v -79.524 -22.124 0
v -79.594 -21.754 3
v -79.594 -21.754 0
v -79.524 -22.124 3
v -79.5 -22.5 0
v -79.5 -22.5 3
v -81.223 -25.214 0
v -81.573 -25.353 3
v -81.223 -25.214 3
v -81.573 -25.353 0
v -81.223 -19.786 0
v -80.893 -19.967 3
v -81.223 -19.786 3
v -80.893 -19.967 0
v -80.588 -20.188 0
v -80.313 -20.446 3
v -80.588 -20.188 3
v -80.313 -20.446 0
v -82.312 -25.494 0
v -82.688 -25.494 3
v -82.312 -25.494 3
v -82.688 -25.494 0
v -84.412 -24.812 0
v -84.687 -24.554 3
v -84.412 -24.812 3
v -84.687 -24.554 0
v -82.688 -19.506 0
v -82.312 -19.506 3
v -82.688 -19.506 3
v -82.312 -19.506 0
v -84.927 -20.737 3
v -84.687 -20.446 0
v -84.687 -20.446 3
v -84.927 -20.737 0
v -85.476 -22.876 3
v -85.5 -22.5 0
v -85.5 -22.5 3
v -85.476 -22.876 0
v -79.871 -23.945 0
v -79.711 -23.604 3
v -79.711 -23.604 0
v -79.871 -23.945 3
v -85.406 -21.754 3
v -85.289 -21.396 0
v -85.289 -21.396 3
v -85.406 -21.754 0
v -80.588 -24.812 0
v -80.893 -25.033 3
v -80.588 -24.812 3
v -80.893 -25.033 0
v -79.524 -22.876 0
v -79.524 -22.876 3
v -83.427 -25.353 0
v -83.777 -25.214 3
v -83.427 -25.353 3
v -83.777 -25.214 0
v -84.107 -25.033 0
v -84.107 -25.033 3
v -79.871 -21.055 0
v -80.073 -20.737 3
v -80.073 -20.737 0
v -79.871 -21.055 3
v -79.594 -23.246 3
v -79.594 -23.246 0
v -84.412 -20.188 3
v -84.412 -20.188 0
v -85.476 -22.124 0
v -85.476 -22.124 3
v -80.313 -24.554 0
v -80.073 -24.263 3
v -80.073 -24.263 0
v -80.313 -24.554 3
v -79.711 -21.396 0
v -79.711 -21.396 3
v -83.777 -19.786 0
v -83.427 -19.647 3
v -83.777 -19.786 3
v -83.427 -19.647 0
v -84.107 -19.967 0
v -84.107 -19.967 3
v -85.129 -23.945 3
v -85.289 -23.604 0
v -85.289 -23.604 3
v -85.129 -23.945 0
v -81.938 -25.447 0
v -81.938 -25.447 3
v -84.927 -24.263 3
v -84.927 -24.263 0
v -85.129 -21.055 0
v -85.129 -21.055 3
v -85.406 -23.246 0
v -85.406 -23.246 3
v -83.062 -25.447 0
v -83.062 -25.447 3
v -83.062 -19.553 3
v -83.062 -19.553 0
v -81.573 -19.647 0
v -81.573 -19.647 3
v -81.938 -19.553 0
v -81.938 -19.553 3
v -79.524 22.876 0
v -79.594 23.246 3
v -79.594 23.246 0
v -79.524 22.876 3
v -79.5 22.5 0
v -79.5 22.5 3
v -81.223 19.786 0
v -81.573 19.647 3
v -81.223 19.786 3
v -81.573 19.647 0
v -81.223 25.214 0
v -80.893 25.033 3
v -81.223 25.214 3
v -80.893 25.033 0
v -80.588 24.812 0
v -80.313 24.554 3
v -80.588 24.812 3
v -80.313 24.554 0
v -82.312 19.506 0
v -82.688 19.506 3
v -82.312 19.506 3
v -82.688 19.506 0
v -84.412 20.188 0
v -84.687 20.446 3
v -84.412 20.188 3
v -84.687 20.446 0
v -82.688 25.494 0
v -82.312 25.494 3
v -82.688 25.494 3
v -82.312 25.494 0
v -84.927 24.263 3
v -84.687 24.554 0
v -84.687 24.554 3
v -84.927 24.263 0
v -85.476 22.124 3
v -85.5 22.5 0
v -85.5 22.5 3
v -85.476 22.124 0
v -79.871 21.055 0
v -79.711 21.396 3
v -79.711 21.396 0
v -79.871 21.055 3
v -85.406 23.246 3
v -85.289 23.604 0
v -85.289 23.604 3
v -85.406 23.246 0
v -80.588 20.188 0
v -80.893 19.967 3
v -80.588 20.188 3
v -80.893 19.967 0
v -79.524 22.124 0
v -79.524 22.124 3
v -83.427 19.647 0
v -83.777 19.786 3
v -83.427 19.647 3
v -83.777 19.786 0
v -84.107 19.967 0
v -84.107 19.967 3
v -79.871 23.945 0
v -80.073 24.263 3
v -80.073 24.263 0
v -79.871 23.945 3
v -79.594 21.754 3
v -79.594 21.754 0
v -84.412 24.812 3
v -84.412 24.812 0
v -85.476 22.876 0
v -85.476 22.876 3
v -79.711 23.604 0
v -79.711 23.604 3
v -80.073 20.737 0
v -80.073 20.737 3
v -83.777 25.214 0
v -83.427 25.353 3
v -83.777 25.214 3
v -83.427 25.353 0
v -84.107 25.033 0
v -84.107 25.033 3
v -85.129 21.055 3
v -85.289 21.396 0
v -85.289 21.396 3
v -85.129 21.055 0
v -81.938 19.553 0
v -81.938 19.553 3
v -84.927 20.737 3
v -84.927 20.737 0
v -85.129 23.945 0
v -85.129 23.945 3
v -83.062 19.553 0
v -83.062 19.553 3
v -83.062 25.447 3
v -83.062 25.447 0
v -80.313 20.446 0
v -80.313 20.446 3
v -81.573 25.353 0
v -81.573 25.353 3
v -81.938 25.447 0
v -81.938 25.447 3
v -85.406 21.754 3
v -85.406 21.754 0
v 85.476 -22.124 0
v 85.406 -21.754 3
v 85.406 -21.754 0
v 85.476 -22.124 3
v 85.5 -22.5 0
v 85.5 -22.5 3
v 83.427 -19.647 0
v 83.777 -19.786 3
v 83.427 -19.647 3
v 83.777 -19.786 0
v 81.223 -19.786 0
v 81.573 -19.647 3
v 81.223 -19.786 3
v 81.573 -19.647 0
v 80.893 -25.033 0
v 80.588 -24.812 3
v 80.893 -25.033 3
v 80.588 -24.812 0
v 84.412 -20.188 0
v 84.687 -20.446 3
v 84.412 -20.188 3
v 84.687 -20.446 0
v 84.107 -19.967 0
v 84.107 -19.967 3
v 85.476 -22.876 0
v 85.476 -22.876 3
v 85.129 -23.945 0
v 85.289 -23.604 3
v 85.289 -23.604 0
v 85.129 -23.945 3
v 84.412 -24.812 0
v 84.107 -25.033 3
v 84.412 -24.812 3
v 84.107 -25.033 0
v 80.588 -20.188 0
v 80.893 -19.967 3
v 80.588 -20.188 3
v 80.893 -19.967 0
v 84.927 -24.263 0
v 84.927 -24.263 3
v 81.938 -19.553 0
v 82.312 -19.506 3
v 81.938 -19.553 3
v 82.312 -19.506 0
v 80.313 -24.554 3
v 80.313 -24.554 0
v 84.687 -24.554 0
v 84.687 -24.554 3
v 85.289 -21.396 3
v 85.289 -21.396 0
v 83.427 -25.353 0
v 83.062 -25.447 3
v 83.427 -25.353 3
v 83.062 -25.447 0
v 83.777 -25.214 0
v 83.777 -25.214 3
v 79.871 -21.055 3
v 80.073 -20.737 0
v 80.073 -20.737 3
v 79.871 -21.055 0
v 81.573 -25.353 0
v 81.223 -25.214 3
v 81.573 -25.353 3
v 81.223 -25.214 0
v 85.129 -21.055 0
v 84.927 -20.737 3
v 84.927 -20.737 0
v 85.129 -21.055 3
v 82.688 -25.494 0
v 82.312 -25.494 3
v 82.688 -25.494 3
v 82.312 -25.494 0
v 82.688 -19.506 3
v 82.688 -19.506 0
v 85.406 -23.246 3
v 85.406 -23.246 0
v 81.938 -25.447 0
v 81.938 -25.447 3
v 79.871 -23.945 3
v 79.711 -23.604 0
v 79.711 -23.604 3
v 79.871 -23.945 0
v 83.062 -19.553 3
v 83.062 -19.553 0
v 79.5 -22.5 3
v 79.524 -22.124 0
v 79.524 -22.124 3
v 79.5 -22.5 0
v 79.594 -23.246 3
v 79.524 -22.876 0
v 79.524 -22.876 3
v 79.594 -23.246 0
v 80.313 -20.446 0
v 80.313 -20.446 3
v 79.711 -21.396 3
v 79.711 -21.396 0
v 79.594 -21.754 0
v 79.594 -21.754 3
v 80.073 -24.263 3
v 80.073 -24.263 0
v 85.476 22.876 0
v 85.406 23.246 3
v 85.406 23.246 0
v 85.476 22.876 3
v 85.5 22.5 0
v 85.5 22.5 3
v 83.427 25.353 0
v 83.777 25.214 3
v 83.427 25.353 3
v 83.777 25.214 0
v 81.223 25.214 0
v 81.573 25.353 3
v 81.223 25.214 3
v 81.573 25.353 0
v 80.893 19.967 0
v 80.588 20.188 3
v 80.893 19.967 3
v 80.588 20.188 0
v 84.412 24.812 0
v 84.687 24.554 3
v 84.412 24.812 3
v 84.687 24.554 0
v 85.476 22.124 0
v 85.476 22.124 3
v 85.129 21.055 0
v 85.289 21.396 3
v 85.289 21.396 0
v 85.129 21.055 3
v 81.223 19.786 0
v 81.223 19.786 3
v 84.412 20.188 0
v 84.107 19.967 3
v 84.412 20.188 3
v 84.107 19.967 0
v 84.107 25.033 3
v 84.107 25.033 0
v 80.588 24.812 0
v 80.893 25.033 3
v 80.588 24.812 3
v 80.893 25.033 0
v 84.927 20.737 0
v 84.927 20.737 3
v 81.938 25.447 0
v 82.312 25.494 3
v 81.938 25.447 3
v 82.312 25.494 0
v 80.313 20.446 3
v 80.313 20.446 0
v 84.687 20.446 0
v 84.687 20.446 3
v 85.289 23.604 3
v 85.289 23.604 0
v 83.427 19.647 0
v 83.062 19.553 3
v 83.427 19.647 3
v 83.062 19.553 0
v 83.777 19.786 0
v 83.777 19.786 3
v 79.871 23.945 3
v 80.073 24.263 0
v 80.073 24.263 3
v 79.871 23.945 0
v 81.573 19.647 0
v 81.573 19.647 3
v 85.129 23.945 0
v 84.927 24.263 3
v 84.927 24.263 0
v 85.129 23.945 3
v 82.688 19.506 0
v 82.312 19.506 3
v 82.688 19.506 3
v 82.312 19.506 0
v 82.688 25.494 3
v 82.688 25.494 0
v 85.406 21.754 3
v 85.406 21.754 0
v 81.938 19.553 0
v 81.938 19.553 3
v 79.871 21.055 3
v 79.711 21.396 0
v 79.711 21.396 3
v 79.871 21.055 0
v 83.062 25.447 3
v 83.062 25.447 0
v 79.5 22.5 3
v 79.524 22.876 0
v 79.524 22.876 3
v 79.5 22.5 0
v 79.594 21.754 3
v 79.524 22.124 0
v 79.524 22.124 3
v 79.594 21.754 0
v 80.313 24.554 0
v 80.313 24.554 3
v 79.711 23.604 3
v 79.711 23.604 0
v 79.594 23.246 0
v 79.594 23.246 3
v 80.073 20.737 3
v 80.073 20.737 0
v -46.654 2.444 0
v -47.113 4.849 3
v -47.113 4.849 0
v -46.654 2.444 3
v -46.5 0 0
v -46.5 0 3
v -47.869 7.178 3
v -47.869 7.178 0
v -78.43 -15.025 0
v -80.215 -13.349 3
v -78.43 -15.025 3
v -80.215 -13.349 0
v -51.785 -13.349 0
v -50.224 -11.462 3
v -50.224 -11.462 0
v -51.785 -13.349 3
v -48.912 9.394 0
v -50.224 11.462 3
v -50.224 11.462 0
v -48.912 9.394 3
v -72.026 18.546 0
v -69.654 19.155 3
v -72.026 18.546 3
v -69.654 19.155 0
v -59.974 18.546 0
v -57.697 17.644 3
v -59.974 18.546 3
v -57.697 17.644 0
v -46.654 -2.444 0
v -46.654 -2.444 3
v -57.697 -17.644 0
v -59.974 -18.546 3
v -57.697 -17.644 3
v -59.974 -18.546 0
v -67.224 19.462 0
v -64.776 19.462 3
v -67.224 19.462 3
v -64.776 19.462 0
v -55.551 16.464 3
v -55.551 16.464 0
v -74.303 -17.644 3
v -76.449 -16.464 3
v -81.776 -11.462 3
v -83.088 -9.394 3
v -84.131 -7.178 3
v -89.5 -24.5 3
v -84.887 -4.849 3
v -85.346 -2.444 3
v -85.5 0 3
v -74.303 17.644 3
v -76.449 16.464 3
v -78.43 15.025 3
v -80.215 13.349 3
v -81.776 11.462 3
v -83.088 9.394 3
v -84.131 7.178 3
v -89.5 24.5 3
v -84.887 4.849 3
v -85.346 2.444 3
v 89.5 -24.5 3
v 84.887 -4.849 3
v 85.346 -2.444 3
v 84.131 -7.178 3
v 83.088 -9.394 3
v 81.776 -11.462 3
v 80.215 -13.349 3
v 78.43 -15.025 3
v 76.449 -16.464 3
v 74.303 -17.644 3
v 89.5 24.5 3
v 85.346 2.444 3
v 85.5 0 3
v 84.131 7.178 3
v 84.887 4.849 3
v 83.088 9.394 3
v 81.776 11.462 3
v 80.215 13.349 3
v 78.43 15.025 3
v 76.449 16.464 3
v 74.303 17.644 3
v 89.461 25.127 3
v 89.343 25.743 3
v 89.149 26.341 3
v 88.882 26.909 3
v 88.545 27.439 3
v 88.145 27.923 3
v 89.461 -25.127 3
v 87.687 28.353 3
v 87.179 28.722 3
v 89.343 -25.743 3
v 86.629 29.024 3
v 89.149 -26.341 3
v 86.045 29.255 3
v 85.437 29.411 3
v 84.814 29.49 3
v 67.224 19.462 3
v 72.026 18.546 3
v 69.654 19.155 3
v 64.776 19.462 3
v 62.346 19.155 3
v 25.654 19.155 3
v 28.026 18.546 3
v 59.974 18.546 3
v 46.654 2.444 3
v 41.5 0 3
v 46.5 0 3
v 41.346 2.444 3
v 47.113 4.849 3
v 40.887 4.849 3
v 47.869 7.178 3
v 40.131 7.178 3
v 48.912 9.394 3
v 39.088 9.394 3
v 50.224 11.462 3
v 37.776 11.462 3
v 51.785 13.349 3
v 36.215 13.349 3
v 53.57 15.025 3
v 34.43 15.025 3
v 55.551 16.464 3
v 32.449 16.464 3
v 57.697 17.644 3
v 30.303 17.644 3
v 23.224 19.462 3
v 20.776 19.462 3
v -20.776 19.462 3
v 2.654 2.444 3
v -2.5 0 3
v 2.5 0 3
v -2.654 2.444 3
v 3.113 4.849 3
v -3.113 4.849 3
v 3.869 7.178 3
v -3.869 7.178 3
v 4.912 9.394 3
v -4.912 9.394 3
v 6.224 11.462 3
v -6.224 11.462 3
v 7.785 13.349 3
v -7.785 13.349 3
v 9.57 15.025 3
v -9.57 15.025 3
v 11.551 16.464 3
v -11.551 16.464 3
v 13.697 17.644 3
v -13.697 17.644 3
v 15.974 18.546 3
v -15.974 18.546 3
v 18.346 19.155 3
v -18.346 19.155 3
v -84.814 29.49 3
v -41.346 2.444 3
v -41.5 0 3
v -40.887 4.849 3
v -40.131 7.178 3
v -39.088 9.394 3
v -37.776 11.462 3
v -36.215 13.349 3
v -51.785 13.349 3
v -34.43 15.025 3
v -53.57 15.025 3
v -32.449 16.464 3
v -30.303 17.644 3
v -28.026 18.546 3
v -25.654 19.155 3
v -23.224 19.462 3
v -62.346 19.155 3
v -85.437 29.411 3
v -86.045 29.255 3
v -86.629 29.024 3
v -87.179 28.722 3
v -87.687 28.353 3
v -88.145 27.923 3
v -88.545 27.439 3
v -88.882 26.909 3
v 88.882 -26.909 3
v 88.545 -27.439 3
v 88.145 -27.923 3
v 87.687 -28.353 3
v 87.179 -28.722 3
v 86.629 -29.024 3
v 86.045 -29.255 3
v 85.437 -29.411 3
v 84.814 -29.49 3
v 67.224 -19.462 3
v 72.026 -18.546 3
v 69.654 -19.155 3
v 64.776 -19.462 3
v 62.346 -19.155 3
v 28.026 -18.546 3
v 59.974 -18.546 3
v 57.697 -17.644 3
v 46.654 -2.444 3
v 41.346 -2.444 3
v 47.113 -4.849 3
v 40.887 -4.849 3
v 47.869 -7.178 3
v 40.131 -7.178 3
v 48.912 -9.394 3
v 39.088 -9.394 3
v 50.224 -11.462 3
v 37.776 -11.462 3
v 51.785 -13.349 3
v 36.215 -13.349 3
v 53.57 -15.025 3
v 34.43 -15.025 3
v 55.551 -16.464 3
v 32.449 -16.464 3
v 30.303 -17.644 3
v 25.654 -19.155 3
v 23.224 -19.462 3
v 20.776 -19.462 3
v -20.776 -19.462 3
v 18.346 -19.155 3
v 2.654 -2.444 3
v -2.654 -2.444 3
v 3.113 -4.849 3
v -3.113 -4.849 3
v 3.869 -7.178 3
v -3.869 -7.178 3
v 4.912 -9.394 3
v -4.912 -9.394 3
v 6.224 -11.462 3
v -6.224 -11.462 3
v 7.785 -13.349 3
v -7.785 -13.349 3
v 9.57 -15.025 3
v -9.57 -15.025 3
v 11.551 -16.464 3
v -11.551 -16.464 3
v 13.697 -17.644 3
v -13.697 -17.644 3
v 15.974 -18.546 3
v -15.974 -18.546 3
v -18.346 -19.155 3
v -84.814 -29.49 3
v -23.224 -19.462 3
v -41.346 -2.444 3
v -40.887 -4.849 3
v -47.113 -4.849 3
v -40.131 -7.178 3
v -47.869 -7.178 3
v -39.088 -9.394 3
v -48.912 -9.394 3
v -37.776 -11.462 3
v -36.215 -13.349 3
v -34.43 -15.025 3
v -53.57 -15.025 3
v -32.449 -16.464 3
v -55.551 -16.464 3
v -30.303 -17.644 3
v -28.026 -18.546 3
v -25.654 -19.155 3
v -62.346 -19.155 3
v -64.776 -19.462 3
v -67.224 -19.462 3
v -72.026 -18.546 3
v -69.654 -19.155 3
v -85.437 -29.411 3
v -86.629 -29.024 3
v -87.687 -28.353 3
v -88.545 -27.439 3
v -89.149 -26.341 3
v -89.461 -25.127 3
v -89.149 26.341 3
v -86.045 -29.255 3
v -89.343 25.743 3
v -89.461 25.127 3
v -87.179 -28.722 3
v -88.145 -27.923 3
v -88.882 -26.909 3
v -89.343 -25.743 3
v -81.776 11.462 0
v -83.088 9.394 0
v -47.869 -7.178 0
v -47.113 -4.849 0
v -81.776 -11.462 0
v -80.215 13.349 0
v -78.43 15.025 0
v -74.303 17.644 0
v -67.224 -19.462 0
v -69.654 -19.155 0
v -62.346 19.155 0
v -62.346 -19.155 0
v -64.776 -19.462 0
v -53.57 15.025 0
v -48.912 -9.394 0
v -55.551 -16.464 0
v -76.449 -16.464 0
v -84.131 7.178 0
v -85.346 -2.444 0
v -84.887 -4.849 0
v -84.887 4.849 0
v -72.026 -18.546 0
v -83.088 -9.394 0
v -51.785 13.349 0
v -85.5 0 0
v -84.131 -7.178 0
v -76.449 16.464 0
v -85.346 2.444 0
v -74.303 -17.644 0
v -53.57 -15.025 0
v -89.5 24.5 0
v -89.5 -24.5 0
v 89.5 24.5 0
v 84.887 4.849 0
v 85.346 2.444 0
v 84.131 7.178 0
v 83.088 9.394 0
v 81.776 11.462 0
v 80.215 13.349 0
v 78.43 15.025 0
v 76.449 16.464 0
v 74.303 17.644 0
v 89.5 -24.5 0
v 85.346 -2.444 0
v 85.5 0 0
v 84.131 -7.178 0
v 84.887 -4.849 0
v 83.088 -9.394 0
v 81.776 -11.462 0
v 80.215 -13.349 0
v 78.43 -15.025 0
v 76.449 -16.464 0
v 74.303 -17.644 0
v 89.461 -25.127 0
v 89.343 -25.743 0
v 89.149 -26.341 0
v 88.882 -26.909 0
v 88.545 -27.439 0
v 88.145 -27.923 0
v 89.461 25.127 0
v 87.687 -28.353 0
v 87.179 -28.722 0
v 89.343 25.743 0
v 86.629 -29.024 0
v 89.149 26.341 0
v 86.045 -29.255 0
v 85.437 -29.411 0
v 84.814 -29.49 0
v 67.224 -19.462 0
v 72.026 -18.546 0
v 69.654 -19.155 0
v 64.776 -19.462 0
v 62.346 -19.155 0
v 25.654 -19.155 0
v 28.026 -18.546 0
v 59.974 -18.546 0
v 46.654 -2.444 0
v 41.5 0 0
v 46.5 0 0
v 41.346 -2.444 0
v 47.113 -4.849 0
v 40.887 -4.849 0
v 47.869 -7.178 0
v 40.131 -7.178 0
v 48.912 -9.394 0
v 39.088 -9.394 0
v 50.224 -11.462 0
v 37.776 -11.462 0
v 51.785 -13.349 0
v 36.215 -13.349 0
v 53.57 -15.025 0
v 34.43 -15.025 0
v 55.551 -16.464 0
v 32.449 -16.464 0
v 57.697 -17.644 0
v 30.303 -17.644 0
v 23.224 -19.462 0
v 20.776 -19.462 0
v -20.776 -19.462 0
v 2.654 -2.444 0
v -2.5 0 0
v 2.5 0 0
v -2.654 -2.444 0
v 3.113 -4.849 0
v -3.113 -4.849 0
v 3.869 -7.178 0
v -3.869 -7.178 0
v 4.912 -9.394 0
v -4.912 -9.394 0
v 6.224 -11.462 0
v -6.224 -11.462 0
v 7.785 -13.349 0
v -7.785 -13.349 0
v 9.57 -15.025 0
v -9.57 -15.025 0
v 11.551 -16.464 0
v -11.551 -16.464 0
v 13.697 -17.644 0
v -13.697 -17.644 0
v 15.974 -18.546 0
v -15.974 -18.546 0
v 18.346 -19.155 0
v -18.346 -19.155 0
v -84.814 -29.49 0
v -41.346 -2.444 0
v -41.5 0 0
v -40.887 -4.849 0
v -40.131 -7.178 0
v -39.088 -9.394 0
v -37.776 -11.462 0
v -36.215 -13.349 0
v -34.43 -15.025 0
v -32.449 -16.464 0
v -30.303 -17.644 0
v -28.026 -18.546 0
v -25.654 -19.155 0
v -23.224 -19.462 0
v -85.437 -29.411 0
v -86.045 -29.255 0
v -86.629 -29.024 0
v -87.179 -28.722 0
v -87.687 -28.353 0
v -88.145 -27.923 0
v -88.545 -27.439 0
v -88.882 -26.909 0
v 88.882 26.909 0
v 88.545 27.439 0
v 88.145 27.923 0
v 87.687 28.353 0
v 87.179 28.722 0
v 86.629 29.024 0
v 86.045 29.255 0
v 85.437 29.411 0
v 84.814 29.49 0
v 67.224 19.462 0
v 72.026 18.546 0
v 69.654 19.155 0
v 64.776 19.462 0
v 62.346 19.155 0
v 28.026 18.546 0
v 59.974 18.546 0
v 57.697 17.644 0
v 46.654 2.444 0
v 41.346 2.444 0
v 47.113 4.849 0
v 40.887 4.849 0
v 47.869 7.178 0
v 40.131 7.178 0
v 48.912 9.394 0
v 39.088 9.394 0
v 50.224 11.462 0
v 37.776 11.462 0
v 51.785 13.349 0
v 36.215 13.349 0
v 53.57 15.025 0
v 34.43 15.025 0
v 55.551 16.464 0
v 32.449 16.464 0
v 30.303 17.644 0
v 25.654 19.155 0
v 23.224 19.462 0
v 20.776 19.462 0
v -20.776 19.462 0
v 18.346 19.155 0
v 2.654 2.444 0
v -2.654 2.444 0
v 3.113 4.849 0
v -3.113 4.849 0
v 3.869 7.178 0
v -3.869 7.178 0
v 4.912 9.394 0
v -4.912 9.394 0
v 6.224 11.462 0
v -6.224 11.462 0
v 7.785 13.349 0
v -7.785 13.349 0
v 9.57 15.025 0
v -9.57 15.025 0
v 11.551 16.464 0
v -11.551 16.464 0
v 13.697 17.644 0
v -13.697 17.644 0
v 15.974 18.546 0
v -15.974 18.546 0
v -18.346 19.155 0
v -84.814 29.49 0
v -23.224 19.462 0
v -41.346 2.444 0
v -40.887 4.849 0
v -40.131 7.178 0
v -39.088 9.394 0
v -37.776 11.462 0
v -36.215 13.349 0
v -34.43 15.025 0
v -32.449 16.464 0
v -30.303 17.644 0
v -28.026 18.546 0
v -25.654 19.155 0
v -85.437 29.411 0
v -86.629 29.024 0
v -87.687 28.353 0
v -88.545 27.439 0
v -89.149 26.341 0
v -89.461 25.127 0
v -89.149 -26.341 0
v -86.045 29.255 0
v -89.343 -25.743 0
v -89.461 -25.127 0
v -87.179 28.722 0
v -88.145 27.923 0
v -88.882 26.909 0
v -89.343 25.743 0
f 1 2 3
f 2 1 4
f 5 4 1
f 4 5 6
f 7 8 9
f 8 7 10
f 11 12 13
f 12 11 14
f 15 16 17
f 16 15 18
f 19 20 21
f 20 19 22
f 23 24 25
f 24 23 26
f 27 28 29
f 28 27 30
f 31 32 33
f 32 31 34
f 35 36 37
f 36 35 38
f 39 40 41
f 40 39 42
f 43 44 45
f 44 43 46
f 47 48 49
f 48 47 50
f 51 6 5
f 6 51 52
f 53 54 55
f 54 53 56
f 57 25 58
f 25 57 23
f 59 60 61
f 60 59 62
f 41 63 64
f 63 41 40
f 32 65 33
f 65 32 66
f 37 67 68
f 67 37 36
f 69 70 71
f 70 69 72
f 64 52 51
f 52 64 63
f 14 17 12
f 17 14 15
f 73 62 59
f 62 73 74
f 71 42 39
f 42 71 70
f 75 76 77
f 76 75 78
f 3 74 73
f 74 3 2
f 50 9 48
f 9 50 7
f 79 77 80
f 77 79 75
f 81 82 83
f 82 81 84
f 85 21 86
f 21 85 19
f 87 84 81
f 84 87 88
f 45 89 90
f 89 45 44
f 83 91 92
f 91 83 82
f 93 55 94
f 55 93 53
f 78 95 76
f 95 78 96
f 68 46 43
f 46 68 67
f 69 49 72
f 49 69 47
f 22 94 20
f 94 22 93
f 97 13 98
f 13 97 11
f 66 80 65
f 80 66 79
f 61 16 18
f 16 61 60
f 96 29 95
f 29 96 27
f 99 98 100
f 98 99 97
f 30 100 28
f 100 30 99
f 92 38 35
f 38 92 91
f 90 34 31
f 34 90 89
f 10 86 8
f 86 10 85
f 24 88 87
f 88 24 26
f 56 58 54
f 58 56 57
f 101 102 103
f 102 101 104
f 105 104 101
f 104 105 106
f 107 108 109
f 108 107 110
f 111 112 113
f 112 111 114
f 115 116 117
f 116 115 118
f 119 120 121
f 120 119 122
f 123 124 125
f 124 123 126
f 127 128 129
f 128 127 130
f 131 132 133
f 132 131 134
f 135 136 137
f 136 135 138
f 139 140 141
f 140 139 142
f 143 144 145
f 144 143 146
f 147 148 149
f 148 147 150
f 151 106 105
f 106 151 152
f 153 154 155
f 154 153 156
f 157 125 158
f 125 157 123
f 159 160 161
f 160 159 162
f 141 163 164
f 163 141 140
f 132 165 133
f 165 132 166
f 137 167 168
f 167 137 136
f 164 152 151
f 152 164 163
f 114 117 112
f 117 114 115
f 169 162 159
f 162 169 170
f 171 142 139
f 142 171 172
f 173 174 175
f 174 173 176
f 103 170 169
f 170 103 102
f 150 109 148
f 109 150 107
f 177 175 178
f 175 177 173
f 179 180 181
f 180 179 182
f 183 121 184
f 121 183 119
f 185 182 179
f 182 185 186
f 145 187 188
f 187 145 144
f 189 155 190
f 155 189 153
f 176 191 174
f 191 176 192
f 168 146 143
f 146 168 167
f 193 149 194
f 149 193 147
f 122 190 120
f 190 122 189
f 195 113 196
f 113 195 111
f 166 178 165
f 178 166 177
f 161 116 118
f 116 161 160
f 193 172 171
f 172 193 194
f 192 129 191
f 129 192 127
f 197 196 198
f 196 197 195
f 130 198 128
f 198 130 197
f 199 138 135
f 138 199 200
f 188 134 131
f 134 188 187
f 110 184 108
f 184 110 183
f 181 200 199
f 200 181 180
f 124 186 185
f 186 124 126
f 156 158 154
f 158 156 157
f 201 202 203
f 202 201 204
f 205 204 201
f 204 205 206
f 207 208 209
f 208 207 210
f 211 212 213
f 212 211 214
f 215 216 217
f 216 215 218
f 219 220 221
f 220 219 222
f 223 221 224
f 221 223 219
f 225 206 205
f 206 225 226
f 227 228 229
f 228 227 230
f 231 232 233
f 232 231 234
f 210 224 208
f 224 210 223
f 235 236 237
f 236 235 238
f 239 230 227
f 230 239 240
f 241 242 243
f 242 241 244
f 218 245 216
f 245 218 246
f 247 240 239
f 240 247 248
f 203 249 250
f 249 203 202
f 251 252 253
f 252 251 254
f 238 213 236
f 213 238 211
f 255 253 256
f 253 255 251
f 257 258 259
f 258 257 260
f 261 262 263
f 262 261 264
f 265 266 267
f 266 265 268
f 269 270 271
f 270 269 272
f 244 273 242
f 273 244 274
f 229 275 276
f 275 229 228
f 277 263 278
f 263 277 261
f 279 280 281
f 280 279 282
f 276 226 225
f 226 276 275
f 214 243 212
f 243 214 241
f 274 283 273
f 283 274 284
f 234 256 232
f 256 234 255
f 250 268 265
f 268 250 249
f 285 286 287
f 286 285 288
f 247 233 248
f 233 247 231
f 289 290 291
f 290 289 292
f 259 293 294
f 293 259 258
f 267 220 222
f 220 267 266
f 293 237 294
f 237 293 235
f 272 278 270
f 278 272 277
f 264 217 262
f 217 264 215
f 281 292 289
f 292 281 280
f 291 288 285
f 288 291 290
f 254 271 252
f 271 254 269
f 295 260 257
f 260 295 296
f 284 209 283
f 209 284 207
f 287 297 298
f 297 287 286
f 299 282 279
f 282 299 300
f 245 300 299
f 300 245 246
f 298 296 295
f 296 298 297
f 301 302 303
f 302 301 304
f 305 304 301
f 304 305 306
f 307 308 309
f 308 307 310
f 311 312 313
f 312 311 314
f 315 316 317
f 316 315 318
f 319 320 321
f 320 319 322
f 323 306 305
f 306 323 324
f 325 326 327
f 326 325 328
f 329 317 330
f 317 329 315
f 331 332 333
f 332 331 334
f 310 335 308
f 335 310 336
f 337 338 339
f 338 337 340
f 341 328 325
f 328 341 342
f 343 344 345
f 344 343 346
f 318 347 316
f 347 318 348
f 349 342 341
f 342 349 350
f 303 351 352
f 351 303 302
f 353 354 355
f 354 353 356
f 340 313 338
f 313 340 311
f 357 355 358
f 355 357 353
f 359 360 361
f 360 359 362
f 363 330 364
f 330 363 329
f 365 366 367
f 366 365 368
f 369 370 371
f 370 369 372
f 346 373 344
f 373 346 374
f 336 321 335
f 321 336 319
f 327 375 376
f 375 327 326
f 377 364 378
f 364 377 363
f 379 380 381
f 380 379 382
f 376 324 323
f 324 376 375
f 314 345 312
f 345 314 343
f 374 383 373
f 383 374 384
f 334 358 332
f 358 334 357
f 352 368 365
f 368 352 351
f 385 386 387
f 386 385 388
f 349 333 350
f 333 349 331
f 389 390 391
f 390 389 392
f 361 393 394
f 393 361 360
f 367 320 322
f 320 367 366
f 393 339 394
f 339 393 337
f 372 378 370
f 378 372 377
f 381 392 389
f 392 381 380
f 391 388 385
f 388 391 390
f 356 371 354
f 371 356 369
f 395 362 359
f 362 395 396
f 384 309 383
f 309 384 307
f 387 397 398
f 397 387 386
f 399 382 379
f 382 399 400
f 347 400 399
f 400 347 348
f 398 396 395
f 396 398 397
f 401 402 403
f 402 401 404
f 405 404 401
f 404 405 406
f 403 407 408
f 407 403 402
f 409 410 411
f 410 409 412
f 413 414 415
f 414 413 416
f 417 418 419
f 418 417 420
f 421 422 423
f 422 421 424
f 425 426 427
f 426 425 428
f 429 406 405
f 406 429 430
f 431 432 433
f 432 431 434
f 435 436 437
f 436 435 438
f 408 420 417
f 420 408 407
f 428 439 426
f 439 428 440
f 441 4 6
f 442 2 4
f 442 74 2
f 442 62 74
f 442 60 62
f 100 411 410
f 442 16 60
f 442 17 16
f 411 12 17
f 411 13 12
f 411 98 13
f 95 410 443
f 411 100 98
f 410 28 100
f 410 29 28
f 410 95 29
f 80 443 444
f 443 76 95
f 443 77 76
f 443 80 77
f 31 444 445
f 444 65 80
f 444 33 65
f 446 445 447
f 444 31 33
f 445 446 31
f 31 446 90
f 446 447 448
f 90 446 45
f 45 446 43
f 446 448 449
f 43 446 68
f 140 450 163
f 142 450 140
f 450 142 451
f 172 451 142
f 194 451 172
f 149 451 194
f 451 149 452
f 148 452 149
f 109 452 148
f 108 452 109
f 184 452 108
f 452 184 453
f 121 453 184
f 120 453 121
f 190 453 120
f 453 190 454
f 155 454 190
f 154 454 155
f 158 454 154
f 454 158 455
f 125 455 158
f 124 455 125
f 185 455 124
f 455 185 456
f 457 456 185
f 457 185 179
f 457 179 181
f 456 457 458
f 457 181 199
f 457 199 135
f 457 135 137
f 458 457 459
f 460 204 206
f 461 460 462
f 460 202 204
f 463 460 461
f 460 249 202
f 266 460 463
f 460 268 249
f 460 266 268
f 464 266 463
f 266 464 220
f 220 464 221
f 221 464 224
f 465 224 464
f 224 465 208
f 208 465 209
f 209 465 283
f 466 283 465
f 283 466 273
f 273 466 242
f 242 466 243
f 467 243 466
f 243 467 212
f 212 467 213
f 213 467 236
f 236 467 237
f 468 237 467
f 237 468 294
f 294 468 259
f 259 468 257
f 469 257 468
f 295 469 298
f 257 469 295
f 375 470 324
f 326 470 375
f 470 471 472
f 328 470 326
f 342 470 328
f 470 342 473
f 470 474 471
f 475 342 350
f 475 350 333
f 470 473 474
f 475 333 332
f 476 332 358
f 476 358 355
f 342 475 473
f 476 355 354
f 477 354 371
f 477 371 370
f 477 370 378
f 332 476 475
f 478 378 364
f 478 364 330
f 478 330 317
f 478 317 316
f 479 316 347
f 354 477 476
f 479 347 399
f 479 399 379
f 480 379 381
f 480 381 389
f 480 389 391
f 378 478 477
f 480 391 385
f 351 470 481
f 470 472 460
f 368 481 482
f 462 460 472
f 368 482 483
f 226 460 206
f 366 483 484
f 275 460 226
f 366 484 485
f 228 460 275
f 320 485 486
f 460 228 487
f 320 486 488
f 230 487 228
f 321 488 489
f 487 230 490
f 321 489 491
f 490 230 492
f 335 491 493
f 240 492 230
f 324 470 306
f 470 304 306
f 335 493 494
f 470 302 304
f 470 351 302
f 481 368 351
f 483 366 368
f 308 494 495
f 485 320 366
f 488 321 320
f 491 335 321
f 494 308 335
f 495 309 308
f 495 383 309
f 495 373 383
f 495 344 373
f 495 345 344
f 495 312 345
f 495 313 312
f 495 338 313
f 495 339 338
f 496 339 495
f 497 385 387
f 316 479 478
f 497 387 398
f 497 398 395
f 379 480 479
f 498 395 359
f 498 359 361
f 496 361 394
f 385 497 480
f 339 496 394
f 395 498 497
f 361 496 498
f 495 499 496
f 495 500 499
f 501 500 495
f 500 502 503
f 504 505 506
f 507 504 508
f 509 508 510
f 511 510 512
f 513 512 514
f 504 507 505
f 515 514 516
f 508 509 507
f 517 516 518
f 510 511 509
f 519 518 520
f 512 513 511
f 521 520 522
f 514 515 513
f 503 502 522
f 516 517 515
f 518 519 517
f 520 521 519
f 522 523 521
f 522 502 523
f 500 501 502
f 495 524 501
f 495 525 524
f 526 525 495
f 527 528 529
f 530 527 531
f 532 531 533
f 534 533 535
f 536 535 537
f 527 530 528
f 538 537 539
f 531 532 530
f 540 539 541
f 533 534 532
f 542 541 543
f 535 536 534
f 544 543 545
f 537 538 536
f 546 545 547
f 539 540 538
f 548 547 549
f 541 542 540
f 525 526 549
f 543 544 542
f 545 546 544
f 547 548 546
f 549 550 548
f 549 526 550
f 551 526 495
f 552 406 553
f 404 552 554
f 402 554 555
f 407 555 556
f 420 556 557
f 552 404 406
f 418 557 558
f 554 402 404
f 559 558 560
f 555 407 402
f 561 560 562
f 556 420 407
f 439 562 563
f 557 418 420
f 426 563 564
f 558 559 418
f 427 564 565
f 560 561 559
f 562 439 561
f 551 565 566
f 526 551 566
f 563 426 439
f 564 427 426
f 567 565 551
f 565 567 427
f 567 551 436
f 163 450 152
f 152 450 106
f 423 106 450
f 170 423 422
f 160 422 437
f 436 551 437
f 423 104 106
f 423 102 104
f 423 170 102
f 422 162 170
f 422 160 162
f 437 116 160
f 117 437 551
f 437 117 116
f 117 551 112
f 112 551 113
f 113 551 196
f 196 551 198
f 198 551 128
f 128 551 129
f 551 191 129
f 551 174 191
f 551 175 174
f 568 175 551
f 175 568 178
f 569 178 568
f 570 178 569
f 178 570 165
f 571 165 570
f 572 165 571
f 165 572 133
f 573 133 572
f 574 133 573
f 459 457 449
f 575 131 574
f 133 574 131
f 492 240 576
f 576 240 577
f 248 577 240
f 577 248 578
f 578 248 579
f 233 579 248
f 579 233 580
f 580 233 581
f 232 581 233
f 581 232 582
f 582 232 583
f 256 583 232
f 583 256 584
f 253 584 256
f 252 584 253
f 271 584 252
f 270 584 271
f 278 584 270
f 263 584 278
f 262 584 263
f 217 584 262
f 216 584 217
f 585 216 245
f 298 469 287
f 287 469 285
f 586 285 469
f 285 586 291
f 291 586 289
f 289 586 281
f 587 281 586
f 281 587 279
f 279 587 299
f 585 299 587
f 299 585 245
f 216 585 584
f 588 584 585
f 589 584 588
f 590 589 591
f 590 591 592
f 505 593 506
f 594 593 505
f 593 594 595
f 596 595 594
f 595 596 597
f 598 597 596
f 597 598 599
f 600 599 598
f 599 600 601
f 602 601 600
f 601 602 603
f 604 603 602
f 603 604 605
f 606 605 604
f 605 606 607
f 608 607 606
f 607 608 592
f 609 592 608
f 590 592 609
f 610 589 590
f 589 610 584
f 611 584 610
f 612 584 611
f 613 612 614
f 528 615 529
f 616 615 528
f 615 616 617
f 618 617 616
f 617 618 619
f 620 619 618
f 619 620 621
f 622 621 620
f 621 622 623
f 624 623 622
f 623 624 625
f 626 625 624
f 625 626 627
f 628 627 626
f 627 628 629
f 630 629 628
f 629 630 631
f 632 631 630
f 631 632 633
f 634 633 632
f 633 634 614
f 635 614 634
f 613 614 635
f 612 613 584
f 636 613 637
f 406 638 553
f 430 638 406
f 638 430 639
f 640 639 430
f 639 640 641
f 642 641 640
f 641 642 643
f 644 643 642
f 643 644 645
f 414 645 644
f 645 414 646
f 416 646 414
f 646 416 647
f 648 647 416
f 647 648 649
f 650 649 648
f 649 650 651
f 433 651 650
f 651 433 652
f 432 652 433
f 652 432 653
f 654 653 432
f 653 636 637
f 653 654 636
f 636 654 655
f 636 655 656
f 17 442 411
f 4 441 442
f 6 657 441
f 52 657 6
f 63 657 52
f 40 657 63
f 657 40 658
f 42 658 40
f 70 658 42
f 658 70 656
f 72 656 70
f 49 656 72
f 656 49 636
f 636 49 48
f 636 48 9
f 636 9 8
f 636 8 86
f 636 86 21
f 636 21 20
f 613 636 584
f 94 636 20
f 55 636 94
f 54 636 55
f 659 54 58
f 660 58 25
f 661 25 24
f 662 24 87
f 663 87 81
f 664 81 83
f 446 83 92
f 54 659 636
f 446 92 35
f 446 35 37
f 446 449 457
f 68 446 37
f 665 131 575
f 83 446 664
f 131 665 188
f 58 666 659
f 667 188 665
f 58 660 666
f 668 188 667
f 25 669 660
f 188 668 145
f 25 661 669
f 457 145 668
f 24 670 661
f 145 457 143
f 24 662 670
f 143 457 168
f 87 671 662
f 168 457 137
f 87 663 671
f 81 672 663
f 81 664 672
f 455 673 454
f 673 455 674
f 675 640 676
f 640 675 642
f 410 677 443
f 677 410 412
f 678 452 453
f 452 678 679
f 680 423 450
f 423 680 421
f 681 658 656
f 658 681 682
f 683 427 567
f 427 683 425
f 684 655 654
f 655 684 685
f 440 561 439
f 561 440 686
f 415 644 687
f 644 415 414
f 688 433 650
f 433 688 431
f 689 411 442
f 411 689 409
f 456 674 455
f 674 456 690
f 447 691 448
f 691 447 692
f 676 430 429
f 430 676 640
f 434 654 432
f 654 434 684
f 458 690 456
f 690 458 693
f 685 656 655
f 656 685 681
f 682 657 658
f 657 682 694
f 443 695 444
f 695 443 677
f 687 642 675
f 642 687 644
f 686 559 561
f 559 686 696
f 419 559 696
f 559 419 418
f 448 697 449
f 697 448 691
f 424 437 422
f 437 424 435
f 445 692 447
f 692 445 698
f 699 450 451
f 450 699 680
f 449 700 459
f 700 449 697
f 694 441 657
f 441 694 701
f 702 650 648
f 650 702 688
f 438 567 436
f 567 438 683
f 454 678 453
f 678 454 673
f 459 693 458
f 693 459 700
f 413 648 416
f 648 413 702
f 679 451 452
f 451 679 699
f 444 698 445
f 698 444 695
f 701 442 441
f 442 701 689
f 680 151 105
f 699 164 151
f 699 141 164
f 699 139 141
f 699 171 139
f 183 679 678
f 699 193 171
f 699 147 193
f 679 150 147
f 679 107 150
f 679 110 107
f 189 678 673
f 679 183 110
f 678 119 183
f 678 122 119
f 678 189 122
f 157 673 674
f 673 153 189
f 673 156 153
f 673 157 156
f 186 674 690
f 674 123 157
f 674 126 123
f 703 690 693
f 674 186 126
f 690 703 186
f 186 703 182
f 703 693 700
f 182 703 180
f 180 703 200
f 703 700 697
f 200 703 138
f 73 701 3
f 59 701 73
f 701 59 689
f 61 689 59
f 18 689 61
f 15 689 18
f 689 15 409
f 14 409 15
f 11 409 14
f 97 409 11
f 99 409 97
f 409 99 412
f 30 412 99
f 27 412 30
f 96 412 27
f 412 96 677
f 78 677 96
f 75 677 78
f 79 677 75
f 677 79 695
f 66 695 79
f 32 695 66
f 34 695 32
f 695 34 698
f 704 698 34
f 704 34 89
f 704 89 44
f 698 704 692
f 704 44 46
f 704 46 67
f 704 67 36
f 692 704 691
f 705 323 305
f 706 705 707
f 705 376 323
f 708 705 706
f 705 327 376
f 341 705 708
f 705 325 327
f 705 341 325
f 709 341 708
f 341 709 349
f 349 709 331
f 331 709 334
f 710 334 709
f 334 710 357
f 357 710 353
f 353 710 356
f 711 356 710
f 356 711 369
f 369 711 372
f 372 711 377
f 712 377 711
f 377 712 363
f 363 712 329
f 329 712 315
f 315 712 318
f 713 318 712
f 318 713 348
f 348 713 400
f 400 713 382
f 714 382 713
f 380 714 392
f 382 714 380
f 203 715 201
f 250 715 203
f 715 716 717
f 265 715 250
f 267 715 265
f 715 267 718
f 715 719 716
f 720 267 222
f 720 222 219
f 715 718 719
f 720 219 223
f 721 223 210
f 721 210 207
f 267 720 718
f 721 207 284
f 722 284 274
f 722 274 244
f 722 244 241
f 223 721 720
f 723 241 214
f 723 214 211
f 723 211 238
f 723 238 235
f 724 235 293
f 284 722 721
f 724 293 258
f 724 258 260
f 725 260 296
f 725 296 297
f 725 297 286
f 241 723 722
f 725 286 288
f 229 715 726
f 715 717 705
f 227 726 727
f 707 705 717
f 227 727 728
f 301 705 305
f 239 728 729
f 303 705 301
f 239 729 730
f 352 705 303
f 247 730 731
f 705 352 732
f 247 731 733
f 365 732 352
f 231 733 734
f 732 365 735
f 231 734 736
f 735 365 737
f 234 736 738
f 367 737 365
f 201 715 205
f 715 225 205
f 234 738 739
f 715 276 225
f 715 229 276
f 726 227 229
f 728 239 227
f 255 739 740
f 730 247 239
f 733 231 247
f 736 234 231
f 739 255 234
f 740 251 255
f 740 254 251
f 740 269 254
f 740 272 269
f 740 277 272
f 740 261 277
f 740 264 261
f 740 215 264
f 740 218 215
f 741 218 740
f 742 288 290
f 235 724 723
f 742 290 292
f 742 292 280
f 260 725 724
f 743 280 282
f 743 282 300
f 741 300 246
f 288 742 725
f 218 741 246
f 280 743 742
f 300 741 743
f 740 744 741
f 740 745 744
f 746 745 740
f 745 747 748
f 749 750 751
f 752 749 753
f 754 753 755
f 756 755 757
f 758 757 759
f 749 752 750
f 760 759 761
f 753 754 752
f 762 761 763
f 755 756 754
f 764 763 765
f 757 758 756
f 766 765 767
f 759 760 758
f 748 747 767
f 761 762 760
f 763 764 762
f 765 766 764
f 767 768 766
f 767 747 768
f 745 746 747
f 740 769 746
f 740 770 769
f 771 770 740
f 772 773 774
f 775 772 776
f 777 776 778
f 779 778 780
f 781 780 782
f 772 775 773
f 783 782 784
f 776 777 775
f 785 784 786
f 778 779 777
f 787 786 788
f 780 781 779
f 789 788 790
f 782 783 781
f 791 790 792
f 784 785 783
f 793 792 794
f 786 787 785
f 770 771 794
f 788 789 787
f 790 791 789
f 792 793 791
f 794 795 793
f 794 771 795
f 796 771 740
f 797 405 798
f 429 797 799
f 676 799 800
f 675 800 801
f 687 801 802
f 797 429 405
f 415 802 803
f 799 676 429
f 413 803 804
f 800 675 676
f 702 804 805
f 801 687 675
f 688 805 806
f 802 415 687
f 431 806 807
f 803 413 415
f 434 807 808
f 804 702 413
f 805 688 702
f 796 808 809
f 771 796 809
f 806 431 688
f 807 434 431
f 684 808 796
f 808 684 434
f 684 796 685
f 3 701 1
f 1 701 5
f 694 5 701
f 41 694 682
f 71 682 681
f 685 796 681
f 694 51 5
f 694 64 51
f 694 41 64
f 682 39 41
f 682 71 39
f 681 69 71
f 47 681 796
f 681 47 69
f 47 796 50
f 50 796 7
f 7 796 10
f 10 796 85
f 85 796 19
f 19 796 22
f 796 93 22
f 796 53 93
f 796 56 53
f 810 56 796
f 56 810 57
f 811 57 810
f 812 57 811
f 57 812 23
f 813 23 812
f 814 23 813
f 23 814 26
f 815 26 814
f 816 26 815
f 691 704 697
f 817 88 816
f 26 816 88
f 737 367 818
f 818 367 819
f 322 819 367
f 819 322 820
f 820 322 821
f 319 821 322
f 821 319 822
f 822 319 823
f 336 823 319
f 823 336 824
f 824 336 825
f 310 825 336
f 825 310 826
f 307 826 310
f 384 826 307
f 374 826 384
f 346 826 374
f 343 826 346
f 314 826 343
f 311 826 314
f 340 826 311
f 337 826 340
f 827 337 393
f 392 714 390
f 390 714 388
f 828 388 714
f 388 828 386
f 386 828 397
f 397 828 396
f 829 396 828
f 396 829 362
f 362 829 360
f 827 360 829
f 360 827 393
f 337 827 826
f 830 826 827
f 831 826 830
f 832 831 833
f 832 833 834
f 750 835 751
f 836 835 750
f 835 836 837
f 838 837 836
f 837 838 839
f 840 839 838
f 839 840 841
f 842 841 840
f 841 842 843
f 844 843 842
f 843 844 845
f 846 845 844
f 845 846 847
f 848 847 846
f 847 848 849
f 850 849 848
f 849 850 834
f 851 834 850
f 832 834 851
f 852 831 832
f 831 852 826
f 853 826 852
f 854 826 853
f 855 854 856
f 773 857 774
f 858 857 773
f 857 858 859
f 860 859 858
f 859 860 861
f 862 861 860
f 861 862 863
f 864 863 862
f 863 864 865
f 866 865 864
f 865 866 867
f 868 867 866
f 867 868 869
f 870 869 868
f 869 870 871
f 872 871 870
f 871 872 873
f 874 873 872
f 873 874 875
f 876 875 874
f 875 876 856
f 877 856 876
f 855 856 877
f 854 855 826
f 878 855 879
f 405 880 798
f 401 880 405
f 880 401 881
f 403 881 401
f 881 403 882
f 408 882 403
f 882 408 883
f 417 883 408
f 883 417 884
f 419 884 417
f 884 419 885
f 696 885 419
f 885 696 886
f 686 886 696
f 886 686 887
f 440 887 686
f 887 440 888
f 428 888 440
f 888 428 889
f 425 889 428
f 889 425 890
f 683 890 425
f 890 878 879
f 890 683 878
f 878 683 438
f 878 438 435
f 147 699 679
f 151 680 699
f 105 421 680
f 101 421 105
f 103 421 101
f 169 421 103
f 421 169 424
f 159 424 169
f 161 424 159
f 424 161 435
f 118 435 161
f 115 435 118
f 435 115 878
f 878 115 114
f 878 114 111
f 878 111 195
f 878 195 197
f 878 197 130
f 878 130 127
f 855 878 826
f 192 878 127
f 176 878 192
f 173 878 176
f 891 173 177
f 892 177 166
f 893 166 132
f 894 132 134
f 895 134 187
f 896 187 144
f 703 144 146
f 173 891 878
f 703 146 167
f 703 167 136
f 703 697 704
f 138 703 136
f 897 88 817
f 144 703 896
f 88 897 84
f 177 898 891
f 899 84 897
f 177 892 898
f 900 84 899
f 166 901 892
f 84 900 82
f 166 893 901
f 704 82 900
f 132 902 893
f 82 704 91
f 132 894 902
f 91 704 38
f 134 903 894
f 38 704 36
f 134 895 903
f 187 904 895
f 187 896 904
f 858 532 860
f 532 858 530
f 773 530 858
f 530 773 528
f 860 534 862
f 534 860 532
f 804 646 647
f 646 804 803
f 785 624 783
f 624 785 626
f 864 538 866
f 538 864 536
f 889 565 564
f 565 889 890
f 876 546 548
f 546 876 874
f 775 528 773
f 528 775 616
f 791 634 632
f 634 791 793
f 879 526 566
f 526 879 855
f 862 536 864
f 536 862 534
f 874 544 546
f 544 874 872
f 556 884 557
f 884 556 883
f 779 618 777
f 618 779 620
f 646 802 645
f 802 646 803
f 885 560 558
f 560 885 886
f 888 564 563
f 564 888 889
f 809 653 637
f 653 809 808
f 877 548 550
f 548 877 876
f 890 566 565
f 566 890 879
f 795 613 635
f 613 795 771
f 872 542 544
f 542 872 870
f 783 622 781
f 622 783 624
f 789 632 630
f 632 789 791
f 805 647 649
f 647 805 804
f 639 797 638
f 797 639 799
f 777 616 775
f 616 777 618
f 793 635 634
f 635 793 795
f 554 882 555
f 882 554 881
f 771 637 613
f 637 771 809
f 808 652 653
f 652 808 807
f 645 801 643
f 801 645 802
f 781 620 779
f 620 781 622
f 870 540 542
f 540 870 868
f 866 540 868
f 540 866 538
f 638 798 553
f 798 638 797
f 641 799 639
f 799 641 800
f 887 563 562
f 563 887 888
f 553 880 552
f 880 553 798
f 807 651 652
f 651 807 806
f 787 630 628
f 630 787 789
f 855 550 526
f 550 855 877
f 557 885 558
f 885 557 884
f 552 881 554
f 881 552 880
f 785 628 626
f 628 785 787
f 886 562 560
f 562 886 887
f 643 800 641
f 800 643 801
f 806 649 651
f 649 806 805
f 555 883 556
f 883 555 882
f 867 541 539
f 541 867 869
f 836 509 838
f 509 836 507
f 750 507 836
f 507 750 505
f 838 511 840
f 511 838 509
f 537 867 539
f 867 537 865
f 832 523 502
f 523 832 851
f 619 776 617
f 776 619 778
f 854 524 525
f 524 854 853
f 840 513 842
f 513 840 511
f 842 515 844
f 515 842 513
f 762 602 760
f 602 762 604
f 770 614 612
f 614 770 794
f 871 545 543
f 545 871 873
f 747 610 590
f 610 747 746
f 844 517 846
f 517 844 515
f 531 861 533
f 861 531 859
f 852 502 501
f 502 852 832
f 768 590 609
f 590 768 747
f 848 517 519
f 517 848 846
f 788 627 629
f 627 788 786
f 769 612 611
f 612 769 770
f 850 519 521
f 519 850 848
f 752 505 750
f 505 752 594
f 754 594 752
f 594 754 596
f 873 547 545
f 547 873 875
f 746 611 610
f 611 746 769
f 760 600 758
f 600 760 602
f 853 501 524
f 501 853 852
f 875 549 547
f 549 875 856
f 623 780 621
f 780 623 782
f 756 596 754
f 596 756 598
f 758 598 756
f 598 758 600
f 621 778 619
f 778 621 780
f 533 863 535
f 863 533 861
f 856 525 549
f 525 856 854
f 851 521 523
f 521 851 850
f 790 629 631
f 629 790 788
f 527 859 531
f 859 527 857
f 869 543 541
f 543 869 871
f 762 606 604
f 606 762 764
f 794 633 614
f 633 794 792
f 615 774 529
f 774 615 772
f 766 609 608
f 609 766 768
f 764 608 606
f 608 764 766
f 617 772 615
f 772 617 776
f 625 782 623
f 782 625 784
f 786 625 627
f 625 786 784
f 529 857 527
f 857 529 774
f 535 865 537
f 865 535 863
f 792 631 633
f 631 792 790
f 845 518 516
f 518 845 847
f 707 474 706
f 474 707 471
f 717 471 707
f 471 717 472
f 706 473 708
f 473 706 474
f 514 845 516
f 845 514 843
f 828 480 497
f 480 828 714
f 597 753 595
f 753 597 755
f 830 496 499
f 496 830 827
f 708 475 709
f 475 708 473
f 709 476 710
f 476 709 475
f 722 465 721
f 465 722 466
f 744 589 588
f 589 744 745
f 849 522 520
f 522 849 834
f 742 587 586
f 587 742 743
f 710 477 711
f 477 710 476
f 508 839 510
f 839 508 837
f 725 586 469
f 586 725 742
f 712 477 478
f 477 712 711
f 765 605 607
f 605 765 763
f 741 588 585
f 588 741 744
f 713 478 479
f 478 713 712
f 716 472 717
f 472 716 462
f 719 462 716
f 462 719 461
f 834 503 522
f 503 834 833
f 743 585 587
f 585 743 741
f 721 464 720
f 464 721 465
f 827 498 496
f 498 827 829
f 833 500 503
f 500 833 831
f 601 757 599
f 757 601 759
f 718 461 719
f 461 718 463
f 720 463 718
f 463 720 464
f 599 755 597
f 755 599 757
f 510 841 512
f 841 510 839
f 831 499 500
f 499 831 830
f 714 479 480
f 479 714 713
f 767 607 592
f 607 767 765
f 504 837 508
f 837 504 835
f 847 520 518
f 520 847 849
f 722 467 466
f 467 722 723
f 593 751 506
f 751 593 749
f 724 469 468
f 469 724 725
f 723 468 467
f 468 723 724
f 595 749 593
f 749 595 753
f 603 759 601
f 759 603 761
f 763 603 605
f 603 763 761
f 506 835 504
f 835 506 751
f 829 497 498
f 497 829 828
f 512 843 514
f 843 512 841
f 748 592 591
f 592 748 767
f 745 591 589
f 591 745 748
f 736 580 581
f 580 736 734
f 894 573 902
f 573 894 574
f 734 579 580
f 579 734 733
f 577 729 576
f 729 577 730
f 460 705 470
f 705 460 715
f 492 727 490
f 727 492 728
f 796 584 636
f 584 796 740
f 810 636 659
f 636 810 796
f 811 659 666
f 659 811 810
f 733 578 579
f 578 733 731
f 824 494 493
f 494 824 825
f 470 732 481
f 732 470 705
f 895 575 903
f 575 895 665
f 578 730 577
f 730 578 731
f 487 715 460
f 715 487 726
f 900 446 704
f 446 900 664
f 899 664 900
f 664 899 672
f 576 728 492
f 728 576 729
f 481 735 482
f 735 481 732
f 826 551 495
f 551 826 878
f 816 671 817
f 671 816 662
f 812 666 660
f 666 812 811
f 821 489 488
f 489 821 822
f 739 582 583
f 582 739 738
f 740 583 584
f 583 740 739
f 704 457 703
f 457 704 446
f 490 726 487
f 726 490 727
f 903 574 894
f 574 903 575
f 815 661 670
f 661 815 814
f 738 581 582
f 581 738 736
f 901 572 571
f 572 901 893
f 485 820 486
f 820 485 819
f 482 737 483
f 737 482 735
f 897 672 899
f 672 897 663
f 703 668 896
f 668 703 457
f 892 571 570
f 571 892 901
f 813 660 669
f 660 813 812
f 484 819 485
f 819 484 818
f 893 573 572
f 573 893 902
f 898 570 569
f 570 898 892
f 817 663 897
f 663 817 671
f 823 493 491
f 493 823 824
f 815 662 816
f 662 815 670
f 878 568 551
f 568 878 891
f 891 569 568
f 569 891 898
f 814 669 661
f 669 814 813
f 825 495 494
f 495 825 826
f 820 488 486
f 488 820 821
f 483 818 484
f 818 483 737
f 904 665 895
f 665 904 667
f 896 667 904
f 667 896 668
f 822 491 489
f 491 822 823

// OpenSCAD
$fn = 50;


difference() {
	union() {
		hull() {
			translate(v = [-84.5000000000, 24.5000000000, 0]) {
				cylinder(h = 3, r = 5);
			}
			translate(v = [84.5000000000, 24.5000000000, 0]) {
				cylinder(h = 3, r = 5);
			}
			translate(v = [-84.5000000000, -24.5000000000, 0]) {
				cylinder(h = 3, r = 5);
			}
			translate(v = [84.5000000000, -24.5000000000, 0]) {
				cylinder(h = 3, r = 5);
			}
		}
	}
	union() {
		#translate(v = [-82.5000000000, -22.5000000000, -100.0000000000]) {
			cylinder(h = 200, r = 3.0000000000);
		}
		#translate(v = [-82.5000000000, 22.5000000000, -100.0000000000]) {
			cylinder(h = 200, r = 3.0000000000);
		}
		#translate(v = [82.5000000000, -22.5000000000, -100.0000000000]) {
			cylinder(h = 200, r = 3.0000000000);
		}
		#translate(v = [82.5000000000, 22.5000000000, -100.0000000000]) {
			cylinder(h = 200, r = 3.0000000000);
		}
		#translate(v = [-66.0000000000, 0, 0]) {
			cylinder(h = 3, r = 19.5000000000);
		}
		#translate(v = [-22.0000000000, 0, 0]) {
			cylinder(h = 3, r = 19.5000000000);
		}
		#translate(v = [22.0000000000, 0, 0]) {
			cylinder(h = 3, r = 19.5000000000);
		}
		#translate(v = [66.0000000000, 0, 0]) {
			cylinder(h = 3, r = 19.5000000000);
		}
	}
}
